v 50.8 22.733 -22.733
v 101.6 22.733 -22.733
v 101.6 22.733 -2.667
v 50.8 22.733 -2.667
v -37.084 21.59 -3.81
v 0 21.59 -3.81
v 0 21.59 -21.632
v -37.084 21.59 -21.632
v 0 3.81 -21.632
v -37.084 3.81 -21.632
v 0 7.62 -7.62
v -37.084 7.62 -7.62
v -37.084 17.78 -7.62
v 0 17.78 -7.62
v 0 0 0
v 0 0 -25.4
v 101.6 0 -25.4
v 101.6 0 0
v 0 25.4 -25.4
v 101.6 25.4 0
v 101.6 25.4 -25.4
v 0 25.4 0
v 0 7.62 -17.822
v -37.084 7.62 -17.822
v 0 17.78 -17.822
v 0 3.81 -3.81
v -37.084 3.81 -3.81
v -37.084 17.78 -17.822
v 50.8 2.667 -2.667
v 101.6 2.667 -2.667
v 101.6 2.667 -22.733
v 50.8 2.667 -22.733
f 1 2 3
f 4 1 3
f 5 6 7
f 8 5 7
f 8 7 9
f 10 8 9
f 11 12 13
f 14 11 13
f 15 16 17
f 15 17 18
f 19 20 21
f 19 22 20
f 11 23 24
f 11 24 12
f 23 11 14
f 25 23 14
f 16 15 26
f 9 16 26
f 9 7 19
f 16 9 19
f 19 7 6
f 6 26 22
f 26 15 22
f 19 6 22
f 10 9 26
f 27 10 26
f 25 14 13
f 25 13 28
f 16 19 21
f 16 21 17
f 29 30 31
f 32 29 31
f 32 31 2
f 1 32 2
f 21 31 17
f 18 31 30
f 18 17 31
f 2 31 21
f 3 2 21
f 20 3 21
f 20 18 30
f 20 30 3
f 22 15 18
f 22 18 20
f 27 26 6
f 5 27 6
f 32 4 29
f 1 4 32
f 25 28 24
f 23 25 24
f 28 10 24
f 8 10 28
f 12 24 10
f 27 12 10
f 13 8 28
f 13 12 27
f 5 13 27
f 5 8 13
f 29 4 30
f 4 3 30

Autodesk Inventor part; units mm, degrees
ref_plane "YZ Plane" through (0, 0, 0) normal (1, 0, 0) x (0, 1, 0)
ref_plane "XZ Plane" through (0, 0, 0) normal (0, 1, 0) x (-1, 0, 0)
ref_plane "XY Plane" through (0, 0, 0) normal (0, 0, 1) x (1, 0, 0)
sketch "Sketch1" plane through (0, 0, 0) normal (1, 0, 0) x (0, 1, 0)
  line L0 (0, 0) -> (25.4, 0)
  line L1 (25.4, 0) -> (25.4, -25.4)
  line L2 (25.4, -25.4) -> (0, -25.4)
  line L3 (0, -25.4) -> (0, 0)
  line L4 (0, 0) -> (3.175, 0)
  line L5 (0, -3.175) -> (0, 0)
  line L6 (3.175, -3.175) -> (22.225, -3.175)
  line L7 (22.225, -3.175) -> (22.225, -22.225)
  line L8 (22.225, -22.225) -> (3.175, -22.225)
  line L9 (3.175, -22.225) -> (3.175, -3.175)
  dimension "d0" = 25.4
  dimension "d1" = 25.4
  dimension "d6" = 19.05
  dimension "d7" = 19.05
extrude "Extrusion1" add sketch "Sketch1" along normal blind 101.6 contours L0 L1 L2 L3 | L6 L7 L8 L9
sketch "Sketch2" plane through (101.6, 0, 0) normal (1, 0, 0) x (0, 0, -1)
  line L0 (22.733, 22.225) -> (22.733, 22.733)
  line L1 (22.733, 22.733) -> (22.225, 22.733)
  line L2 (2.667, 3.175) -> (2.667, 2.667)
  line L3 (2.667, 2.667) -> (3.175, 2.667)
  line L4 (2.667, 2.667) -> (22.733, 2.667)
  line L5 (22.733, 2.667) -> (22.733, 22.733)
  line L6 (22.733, 22.733) -> (2.667, 22.733)
  line L7 (2.667, 22.733) -> (2.667, 2.667)
  point P0 (0, 0)
extrude "Extrusion2" cut sketch "Sketch2" against normal blind 50.8
sketch "Sketch3" plane through (0, 0, 0) normal (-1, 0, 0) x (0, 0, 1)
  line L0 (-25.4, 0) -> (-21.6315, 0)
  line L1 (-21.6315, 3.81) -> (-17.78, 3.81)
  line L2 (-21.6315, 7.62) -> (-21.6315, 3.81)
  line L3 (-3.81, 21.59) -> (-7.62, 21.59)
  line L4 (-3.81, 17.78) -> (-3.81, 21.59)
  line L5 (-21.6315, 3.81) -> (-3.81, 3.81)
  line L6 (-3.81, 3.81) -> (-3.81, 21.59)
  line L7 (-3.81, 21.59) -> (-21.6315, 21.59)
  line L8 (-21.6315, 21.59) -> (-21.6315, 3.81)
  line L9 (-17.8215, 7.6198) -> (-7.62, 7.6198)
  line L10 (-7.62, 7.6198) -> (-7.62, 17.78)
  line L11 (-7.62, 17.78) -> (-17.8215, 17.78)
  line L12 (-17.8215, 17.78) -> (-17.8215, 7.6198)
  point P0 (0, 25.4)
extrude "Extrusion3" add sketch "Sketch3" along normal blind 37.084
properties part number "Right Side PIece Corrected 0.02 inch"
